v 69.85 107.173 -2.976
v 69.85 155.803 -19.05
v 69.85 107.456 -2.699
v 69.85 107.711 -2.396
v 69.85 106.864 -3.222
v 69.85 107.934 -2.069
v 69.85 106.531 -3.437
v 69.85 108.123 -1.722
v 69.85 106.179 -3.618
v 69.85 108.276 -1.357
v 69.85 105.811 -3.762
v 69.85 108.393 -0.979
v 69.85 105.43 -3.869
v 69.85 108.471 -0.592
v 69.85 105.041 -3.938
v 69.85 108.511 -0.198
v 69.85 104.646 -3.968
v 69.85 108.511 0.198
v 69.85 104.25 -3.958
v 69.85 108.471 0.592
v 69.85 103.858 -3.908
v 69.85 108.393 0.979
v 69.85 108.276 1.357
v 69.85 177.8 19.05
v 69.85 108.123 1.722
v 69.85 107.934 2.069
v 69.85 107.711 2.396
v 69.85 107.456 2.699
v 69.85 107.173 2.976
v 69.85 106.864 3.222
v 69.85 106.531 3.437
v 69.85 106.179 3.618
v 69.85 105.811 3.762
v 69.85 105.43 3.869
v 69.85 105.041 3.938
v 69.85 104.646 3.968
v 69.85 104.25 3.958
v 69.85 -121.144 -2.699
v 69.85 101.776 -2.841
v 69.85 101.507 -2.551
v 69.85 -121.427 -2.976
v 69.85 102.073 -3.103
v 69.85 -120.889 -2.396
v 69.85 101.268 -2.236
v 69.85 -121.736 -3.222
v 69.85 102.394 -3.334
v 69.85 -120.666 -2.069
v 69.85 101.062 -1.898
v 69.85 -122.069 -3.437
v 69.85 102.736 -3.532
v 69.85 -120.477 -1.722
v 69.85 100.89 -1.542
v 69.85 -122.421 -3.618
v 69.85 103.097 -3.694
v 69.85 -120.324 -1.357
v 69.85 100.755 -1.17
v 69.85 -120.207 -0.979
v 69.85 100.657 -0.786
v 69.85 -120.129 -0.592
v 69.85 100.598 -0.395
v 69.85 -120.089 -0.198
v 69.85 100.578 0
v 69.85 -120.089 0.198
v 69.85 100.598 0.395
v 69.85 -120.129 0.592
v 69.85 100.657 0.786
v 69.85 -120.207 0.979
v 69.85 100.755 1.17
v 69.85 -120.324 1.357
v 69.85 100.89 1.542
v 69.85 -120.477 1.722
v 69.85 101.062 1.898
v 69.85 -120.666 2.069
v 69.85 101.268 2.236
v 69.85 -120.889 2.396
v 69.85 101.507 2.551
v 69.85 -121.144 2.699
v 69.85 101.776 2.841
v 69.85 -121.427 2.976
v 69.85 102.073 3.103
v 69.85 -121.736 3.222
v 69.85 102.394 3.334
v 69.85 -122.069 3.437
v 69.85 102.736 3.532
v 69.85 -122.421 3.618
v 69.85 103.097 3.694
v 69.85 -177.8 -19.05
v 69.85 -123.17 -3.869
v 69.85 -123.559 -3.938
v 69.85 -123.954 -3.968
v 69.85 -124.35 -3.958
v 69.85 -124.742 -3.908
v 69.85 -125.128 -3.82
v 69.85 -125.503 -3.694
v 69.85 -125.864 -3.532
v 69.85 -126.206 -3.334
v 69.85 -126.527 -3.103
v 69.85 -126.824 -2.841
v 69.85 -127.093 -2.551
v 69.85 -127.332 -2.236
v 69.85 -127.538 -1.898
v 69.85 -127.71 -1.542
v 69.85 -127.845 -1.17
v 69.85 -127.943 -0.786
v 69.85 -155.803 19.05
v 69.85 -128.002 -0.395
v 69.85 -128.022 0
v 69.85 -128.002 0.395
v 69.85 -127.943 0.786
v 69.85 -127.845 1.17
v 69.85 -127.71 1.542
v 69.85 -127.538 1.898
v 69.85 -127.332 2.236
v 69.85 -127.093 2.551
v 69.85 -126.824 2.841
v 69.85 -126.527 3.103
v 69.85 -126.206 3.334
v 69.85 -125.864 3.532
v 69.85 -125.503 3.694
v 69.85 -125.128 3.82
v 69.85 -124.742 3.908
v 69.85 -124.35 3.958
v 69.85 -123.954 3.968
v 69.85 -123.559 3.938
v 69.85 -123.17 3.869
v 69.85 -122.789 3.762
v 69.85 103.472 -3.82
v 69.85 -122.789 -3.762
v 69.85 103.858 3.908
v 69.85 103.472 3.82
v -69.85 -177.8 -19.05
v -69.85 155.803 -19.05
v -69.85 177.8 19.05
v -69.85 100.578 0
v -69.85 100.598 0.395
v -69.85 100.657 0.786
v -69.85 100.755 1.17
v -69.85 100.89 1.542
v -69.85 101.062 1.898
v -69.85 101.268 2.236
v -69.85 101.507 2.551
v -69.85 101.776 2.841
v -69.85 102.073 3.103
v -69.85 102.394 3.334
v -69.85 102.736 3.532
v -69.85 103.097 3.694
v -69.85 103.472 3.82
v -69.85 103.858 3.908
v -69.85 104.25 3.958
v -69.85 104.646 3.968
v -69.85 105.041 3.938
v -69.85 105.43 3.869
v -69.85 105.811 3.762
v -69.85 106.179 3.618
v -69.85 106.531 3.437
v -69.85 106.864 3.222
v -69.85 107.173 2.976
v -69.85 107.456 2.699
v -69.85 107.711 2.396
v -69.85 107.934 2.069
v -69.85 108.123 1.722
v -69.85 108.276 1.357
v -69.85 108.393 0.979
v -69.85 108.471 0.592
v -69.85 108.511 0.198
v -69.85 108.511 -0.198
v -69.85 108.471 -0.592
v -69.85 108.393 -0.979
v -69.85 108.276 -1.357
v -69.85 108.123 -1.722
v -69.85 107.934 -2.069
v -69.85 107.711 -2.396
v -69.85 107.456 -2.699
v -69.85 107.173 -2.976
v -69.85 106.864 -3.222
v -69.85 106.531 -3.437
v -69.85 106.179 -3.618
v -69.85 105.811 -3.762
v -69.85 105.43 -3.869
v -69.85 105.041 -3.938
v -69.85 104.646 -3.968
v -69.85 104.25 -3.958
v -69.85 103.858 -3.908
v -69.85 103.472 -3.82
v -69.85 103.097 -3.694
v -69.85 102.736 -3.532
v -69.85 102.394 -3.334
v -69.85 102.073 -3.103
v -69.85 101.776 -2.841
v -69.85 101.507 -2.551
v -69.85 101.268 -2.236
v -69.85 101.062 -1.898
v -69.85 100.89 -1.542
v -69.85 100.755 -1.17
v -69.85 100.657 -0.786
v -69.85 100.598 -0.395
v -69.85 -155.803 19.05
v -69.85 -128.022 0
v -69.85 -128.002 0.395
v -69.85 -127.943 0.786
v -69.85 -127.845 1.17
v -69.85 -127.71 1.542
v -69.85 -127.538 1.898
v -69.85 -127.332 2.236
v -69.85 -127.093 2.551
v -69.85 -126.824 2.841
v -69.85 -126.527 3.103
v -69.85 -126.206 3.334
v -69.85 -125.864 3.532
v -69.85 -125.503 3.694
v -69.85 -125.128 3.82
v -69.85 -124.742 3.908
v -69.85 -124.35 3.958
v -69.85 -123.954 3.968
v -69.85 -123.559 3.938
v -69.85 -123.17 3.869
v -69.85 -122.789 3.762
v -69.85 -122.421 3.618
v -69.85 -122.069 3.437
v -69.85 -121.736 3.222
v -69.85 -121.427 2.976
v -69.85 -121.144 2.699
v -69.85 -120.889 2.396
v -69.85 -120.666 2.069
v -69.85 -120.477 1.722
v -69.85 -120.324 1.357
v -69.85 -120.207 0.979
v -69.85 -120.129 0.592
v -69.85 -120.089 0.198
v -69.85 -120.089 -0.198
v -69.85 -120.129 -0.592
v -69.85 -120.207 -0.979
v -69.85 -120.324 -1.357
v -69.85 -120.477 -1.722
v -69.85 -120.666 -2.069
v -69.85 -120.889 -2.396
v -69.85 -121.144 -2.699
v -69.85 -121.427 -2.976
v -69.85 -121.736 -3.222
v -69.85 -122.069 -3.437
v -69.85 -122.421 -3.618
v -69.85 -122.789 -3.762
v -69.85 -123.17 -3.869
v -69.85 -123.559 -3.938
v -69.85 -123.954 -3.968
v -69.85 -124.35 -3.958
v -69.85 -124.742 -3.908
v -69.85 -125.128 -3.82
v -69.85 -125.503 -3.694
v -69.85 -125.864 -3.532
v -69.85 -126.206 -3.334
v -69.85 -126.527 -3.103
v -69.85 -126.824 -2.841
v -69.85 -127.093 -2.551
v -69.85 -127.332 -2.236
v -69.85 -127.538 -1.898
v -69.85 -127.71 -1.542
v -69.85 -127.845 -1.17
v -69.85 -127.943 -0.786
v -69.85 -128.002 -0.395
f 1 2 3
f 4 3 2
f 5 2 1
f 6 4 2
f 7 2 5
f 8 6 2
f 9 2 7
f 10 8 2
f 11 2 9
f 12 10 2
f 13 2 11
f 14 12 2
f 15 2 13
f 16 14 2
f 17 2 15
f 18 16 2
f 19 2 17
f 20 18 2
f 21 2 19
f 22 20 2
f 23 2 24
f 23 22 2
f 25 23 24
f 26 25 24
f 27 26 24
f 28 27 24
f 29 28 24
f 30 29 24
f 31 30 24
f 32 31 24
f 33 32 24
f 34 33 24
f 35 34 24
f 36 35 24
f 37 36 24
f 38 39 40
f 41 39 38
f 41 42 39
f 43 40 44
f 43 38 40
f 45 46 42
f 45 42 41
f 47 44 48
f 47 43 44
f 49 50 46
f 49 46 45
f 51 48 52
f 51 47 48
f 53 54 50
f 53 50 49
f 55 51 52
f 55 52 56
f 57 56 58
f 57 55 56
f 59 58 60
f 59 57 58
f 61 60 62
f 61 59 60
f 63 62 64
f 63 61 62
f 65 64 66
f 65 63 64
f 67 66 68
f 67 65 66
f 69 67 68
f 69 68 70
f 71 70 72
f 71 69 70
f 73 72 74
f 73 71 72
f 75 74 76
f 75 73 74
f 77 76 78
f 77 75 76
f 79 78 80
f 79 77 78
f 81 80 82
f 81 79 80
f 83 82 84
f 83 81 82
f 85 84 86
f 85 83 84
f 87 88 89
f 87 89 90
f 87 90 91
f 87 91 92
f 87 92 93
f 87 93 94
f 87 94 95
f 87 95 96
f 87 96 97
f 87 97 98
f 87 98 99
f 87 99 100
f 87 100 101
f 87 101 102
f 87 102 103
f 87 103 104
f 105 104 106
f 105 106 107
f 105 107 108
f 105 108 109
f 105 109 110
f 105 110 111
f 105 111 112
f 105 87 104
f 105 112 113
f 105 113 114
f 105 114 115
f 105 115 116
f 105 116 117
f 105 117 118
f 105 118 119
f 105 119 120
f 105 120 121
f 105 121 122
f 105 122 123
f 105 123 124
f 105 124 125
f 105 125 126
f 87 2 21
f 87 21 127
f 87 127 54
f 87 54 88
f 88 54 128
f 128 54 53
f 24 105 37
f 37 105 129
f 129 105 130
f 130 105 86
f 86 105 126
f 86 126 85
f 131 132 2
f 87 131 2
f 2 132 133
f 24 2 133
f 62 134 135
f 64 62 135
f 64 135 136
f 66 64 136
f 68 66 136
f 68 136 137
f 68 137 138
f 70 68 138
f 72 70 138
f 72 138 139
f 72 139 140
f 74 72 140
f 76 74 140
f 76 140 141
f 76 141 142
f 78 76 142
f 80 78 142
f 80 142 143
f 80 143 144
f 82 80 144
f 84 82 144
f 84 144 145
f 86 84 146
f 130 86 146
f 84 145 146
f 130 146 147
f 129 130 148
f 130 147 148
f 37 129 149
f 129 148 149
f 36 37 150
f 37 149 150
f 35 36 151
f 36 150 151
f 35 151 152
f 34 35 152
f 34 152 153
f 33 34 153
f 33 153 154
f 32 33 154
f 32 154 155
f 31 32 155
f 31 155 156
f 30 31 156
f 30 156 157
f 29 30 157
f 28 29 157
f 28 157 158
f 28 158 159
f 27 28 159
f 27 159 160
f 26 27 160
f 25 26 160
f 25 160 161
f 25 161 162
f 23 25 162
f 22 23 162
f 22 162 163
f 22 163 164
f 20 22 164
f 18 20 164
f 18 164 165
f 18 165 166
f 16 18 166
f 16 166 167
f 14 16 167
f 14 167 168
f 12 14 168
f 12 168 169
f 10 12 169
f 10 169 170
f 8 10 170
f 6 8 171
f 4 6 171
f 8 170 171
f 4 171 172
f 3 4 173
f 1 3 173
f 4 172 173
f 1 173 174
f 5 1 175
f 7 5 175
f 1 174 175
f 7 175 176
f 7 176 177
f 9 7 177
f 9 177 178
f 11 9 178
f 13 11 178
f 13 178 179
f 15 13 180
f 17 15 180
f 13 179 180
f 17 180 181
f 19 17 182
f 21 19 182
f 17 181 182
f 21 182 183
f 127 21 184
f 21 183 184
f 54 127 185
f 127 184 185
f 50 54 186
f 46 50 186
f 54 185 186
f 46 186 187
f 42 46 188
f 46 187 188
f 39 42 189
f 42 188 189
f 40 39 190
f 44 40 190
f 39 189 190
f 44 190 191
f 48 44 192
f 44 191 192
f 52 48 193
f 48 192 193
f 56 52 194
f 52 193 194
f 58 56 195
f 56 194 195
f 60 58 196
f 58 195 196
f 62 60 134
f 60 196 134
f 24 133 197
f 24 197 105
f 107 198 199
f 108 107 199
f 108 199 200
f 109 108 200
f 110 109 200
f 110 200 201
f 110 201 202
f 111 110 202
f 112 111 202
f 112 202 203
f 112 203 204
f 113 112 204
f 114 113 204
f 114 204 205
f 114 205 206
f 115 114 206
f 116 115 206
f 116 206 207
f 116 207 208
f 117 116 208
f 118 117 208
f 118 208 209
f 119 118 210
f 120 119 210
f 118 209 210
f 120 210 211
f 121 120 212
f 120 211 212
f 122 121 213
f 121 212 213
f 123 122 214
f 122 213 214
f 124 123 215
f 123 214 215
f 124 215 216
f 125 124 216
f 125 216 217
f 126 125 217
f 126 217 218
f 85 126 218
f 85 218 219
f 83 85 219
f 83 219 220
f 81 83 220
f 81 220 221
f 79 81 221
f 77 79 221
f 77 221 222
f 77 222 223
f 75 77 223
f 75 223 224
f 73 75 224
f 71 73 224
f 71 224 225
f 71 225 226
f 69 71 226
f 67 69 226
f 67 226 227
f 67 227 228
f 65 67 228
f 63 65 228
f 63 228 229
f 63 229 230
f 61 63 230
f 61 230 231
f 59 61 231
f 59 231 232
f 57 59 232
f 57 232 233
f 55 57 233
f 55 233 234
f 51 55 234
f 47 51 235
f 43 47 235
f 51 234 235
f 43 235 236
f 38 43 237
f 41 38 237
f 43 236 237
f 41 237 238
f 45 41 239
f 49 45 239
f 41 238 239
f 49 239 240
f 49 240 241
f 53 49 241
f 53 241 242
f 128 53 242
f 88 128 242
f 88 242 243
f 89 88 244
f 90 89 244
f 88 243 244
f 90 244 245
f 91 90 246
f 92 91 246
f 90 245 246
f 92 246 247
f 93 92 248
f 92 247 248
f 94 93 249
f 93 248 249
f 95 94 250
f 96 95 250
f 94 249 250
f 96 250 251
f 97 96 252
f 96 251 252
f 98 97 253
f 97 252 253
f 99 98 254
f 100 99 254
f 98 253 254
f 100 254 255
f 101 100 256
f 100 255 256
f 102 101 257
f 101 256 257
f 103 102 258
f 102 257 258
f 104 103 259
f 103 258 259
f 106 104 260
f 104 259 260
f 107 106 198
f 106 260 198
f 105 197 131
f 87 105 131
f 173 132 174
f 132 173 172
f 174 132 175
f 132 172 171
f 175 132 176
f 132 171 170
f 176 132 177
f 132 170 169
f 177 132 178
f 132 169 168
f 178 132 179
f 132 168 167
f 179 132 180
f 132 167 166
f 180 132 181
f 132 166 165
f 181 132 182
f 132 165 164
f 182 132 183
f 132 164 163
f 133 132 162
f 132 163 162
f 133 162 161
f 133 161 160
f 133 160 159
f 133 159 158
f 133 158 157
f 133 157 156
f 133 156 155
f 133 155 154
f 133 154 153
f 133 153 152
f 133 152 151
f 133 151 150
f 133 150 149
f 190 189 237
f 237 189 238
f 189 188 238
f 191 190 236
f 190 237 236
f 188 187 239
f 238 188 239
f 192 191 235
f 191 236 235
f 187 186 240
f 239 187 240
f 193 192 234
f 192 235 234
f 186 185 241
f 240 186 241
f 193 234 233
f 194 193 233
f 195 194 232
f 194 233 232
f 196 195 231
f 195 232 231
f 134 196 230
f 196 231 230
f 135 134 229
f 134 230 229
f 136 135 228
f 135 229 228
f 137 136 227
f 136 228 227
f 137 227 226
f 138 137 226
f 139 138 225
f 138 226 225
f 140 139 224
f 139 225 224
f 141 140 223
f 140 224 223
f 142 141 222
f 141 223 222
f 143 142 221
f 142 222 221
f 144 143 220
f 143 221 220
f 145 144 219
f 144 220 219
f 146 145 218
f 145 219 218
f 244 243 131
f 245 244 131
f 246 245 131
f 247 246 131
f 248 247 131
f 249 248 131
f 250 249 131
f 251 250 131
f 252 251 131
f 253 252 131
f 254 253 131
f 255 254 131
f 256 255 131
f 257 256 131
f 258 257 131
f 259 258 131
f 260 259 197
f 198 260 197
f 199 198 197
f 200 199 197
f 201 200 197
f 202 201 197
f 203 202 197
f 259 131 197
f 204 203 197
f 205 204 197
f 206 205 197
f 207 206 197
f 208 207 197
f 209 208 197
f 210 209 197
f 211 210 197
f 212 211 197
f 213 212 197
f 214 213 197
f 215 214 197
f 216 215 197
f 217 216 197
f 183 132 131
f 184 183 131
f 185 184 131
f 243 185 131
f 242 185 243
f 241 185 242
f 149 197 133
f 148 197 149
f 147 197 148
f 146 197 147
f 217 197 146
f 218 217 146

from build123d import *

# Parameters (mm, degrees)
F0_W          = 139.7
F0_H          = 38.1
F1_DEPTH      = 177.8
F1_DEPTH_BACK = 177.8
F3_DEPTH      = 139.7
F4_R          = 3.96875
F5_DEPTH      = 139.701


with BuildPart() as f1:
    # F0 (on Front) → F1 (new body, two sides)
    with BuildSketch(Plane.XZ) as f1_sk:
        Rectangle(F0_W, F0_H)
    extrude(amount=F1_DEPTH)
    extrude(f1_sk.sketch, amount=-F1_DEPTH_BACK)

    # F2 (on face) → F3 (cut, through all)
    with BuildSketch(Plane(origin=(-69.85, 0, 0), x_dir=(0, -1, 0), z_dir=(-1, 0, 0))):
        Polygon((-155.802955, -19.05), (-177.8, 19.05), (-177.8, -19.05), align=None)
        Polygon((177.8, -19.05), (177.8, 19.05), (155.802955, 19.05), align=None)
    extrude(amount=-F3_DEPTH, mode=Mode.SUBTRACT)

    # F4 (on face) → F5 (cut, through all)
    with BuildSketch(Plane(origin=(-69.85, 0, 0), x_dir=(0, -1, 0), z_dir=(-1, 0, 0))):
        with Locations((-104.547045, 0)):
            Circle(F4_R)
        with Locations((124.052955, 0)):
            Circle(F4_R)
    extrude(amount=-F5_DEPTH, mode=Mode.SUBTRACT)


solid = f1.part
